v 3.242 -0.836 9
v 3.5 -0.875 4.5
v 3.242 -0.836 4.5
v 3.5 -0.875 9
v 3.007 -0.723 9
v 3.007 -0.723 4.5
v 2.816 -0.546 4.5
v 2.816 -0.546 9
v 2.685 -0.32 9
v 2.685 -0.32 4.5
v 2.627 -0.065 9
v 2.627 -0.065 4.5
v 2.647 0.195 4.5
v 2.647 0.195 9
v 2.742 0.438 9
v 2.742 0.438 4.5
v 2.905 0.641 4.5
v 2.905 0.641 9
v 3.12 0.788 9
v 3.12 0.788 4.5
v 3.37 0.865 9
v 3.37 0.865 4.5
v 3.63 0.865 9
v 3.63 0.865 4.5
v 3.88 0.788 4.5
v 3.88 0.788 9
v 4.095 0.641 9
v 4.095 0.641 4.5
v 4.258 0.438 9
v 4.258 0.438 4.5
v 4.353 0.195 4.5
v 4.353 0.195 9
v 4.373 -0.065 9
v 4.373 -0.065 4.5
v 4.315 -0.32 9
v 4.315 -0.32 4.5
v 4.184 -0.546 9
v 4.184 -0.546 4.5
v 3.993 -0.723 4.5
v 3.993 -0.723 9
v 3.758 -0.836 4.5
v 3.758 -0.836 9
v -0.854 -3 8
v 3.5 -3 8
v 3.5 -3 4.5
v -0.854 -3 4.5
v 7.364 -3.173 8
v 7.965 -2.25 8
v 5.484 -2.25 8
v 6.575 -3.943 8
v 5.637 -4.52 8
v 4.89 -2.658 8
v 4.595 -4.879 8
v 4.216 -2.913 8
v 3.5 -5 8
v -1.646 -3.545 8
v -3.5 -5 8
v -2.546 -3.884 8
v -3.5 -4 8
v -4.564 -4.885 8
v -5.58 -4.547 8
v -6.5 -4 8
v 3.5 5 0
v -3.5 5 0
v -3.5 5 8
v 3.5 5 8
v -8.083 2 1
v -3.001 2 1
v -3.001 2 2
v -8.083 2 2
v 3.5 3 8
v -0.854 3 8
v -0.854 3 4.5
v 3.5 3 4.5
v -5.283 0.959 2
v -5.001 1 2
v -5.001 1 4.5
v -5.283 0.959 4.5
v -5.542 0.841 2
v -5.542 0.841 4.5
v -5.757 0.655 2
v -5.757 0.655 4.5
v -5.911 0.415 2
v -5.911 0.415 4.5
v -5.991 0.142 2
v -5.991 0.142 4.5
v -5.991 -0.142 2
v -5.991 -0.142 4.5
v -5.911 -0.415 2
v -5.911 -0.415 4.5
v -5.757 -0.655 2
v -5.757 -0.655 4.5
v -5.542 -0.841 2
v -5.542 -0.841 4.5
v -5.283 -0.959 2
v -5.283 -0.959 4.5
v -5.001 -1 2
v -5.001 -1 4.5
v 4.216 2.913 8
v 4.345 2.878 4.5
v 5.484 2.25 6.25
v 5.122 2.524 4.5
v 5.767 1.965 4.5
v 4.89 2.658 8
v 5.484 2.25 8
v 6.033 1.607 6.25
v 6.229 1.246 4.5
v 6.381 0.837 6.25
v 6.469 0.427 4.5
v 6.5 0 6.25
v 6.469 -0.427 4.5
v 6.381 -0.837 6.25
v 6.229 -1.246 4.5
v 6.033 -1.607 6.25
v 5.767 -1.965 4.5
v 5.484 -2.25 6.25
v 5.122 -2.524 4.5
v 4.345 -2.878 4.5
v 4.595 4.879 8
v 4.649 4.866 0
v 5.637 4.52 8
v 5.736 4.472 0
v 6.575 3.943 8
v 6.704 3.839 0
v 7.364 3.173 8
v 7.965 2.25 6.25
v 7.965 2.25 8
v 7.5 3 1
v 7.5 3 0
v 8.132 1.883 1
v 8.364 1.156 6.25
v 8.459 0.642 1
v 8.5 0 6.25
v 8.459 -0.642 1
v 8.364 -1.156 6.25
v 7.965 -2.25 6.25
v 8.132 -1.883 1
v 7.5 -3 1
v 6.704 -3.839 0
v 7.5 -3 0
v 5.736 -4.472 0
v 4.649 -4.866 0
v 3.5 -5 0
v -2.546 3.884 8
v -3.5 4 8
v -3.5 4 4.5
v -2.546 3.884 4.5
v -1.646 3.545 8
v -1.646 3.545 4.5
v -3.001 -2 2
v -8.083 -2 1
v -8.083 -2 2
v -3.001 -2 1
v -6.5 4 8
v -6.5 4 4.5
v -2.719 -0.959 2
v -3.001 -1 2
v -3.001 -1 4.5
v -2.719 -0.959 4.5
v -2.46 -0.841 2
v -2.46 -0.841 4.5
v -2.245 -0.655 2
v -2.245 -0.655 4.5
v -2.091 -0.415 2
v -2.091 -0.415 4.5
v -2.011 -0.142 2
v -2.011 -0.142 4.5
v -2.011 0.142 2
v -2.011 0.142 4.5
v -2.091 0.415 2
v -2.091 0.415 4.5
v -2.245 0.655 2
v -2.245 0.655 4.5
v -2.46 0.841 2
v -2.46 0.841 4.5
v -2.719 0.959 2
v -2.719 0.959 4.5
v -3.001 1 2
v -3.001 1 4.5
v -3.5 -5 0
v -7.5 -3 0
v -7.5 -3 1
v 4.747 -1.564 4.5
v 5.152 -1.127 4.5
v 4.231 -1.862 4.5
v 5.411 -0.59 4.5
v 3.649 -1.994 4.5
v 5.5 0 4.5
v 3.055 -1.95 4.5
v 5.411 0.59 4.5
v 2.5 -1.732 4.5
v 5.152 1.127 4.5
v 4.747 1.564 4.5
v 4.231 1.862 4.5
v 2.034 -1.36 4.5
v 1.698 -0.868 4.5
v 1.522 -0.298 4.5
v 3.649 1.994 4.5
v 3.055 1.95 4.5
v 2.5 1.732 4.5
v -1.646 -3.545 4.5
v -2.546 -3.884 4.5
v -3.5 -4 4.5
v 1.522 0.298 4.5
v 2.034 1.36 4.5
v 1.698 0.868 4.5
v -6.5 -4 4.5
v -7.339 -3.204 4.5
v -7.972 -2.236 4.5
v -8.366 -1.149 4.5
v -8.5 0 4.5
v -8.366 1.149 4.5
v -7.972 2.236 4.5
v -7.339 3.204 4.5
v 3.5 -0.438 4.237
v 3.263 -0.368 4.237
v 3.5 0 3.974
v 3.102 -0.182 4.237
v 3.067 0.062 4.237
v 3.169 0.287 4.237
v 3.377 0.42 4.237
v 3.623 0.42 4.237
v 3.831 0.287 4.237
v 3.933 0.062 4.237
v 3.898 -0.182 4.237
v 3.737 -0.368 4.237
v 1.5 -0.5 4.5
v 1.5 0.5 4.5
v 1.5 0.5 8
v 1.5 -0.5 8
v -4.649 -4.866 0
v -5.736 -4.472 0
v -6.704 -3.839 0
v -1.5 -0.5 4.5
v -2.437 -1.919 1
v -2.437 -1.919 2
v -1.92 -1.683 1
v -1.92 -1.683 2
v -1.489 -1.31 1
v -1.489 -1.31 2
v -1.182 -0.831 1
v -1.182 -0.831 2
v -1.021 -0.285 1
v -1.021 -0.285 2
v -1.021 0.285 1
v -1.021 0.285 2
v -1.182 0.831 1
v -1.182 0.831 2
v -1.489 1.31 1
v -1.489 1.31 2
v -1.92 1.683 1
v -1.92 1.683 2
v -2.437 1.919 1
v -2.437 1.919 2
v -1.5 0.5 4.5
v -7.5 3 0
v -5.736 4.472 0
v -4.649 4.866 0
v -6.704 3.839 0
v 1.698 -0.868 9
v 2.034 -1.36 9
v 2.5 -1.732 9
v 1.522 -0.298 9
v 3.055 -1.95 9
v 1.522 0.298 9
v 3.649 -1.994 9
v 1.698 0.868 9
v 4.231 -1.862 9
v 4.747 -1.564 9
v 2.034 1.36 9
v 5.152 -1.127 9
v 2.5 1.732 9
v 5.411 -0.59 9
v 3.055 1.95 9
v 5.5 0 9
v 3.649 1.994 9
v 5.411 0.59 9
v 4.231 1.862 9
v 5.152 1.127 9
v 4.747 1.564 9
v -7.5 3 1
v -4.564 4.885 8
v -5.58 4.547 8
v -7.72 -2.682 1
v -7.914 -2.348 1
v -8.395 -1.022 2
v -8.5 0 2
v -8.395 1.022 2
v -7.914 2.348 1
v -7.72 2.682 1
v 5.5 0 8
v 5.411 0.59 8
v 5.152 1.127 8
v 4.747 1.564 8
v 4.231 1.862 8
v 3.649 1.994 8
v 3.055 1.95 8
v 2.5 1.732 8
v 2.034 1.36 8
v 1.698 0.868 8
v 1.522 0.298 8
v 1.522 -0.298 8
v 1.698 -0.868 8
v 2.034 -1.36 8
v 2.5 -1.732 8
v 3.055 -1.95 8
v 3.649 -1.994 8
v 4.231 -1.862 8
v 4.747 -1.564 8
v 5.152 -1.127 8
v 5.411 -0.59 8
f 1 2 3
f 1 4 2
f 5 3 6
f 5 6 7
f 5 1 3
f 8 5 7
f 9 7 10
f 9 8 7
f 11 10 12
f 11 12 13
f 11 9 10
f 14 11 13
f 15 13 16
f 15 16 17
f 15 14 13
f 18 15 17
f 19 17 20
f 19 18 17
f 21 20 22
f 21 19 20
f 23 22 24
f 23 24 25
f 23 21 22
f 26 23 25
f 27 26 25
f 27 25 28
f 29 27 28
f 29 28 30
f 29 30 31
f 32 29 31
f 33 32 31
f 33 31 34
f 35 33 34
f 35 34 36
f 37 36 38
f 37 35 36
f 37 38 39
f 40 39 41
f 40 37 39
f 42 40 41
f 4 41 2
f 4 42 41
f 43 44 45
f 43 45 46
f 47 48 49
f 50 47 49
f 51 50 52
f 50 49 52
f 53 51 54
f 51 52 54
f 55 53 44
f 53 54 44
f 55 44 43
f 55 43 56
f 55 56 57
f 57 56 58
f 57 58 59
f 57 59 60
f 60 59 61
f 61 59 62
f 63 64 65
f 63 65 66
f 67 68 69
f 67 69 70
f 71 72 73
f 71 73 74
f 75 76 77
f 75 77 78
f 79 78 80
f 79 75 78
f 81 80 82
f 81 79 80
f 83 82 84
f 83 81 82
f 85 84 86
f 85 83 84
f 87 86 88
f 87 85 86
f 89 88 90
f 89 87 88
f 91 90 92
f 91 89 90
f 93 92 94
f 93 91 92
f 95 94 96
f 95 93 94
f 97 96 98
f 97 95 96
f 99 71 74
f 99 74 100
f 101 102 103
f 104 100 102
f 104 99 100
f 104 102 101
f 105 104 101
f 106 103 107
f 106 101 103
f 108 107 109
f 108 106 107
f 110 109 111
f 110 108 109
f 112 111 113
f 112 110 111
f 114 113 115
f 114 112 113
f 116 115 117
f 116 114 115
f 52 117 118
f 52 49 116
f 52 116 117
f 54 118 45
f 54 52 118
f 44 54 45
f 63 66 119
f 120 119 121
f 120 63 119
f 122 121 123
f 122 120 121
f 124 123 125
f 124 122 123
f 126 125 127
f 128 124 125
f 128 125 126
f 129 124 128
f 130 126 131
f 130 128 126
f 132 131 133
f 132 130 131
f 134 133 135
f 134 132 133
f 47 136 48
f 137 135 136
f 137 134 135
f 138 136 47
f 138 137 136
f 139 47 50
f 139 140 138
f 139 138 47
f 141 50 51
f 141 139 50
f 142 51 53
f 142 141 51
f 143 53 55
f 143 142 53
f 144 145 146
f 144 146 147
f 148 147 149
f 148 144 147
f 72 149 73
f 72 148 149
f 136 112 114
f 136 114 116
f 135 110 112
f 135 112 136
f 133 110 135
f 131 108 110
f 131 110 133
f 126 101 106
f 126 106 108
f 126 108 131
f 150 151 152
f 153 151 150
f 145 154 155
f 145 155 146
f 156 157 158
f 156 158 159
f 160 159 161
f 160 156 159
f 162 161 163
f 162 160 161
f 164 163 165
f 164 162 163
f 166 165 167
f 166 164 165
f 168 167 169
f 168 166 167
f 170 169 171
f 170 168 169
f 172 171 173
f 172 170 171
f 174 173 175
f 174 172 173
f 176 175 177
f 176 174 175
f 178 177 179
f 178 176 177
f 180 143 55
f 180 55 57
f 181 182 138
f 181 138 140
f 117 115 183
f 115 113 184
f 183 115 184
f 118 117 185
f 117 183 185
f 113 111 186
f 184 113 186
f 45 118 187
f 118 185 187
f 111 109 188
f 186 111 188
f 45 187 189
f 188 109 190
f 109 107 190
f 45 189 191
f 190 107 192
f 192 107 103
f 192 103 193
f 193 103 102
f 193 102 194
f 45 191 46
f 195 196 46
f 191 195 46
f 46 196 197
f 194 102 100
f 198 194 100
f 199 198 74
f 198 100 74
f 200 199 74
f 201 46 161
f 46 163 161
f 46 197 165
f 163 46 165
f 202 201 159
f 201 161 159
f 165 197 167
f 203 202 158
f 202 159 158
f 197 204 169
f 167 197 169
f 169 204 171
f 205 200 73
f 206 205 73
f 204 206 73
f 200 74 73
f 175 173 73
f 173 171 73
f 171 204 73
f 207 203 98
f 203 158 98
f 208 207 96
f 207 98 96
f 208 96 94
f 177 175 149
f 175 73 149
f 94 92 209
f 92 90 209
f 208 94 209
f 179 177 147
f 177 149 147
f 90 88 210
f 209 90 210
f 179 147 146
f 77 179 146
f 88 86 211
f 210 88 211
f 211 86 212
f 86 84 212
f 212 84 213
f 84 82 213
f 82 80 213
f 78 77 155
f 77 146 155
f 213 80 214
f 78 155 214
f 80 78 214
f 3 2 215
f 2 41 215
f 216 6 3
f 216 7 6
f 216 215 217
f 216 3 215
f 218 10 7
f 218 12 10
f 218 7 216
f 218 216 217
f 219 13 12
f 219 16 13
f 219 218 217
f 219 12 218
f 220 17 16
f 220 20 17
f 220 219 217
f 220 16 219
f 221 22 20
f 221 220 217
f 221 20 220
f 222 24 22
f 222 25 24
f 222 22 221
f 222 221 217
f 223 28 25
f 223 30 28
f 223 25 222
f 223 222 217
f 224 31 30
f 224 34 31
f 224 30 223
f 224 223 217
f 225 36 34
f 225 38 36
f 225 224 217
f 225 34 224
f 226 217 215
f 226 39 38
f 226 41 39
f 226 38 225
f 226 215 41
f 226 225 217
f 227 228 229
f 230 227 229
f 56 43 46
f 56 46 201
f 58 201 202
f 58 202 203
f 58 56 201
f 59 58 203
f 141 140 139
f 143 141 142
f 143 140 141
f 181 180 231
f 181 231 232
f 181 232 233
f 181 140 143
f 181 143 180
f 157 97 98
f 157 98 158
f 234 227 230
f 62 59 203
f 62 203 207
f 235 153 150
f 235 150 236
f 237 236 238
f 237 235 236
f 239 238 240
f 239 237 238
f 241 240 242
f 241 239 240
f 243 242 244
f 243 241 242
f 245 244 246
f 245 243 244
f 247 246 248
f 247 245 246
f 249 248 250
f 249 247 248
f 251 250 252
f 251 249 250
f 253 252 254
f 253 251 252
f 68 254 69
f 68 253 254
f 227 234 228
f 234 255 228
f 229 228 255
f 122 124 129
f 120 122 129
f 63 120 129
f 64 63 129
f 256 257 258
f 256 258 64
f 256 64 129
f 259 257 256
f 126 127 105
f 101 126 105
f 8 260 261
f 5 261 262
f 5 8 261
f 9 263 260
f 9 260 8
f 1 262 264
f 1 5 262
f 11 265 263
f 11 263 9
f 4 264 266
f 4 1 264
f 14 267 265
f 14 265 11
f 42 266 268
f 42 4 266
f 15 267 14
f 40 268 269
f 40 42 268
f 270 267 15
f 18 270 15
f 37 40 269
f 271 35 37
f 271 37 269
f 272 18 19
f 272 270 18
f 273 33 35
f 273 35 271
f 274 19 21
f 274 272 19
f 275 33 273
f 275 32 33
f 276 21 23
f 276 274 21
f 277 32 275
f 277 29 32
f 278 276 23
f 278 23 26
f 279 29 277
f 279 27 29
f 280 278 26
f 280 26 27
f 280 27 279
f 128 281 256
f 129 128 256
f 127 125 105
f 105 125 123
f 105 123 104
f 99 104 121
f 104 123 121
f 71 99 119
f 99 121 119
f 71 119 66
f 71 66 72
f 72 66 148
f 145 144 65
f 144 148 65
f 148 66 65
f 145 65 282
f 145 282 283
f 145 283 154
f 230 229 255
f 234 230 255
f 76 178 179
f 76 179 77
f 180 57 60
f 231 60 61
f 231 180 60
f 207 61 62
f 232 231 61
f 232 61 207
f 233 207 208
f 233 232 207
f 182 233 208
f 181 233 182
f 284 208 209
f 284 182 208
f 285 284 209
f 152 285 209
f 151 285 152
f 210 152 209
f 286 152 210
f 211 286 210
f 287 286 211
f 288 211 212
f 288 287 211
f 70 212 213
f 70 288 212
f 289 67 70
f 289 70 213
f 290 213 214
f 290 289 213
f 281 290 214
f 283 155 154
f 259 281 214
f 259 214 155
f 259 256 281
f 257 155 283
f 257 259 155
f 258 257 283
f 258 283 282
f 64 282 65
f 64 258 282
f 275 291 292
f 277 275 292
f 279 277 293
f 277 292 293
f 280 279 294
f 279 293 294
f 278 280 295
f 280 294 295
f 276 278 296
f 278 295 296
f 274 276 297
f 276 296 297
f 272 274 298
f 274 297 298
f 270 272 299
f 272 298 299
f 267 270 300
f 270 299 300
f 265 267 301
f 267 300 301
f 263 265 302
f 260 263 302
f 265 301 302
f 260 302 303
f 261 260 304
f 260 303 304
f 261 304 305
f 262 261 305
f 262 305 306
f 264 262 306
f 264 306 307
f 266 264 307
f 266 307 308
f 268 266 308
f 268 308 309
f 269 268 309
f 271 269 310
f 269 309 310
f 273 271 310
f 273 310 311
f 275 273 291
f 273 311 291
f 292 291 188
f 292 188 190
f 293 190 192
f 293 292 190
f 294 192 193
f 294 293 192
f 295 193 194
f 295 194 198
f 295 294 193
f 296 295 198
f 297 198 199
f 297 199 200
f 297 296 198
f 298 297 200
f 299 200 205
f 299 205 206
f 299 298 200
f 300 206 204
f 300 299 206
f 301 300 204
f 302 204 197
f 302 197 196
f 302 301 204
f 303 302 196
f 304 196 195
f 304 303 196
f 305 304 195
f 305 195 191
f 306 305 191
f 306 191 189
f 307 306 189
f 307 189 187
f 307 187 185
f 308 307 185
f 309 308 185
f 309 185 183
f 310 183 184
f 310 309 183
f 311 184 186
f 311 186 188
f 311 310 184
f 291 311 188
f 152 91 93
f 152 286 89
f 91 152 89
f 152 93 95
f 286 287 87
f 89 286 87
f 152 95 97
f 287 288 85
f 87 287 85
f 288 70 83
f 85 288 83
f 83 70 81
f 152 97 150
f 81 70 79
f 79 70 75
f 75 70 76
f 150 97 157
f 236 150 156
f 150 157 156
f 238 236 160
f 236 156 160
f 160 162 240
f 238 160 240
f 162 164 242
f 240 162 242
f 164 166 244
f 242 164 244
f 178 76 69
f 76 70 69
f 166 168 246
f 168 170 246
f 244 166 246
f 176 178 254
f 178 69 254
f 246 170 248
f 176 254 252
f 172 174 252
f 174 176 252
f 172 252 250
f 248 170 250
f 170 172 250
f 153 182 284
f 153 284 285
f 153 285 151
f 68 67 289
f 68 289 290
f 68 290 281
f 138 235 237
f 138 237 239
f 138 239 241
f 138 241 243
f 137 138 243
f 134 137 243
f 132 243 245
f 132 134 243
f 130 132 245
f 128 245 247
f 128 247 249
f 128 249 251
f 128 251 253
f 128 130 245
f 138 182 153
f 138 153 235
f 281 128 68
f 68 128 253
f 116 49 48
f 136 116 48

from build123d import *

# Parameters (mm, degrees)
BOSS_EXTRUDE1_DEPTH = 8
SKETCH2_W           = 1
SKETCH2_H           = 6
CUT_EXTRUDE1_DEPTH  = 9
CUT_EXTRUDE2_DEPTH  = 1
SKETCH4_R           = 2
CUT_EXTRUDE3_DEPTH  = 3.5
BOSS_EXTRUDE3_DEPTH = 0.5
CUT_EXTRUDE4_DEPTH  = 6.025665282
CUT_EXTRUDE5_DEPTH  = 1.75
SKETCH8_R           = 2
BOSS_EXTRUDE4_DEPTH = 1


with BuildPart() as part:
    # Sketch1 → Boss-Extrude1 (new body)
    with BuildSketch(Plane.XY):
        with BuildLine():
            Line((-3.5, 5), (3.5, 5))
            ThreePointArc((3.5, 5), (8.5, 0), (3.5, -5))
            Line((3.5, -5), (-3.5, -5))
            ThreePointArc((-3.5, -5), (-8.5, 0), (-3.5, 5))
        make_face()
    extrude(amount=BOSS_EXTRUDE1_DEPTH)

    # Sketch2 → Cut-Extrude1 (cut, symmetric)
    with BuildSketch(Plane(origin=(0, 0, 0), x_dir=(0, 0, -1), z_dir=(1, 0, 0))):
        with Locations((-0.5, 0)):
            Rectangle(SKETCH2_W, SKETCH2_H)
    extrude(amount=CUT_EXTRUDE1_DEPTH, both=True, mode=Mode.SUBTRACT)

    # Sketch3 → Cut-Extrude2 (cut)
    with BuildSketch(Plane(origin=(0, 0, 1), x_dir=(-1, 0, 0), z_dir=(0, 0, -1))):
        with BuildLine():
            Line((3.000904035, 2), (8.5, 2))
            ThreePointArc((8.5, 2), (10.5, 0), (8.5, -2))
            Line((8.5, -2), (3.000904035, -2))
            ThreePointArc((3.000904035, -2), (1.000904035, 0), (3.000904035, 2))
        make_face()
    extrude(amount=-CUT_EXTRUDE2_DEPTH, mode=Mode.SUBTRACT)

    # Sketch4 → Cut-Extrude3 (cut)
    with BuildSketch(Plane.XY.offset(8)):
        with BuildLine():
            Line((-9.161583496, 4), (-3.5, 4))
            ThreePointArc((-3.5, 4), (0.5, 0), (-3.5, -4))
            Line((-3.5, -4), (-9.161583496, -4))
            ThreePointArc((-9.161583496, -4), (-13.161583496, 0), (-9.161583496, 4))
        make_face()
        with BuildLine():
            Line((-3.5, 3), (3.5, 3))
            ThreePointArc((3.5, 3), (6.5, 0), (3.5, -3))
            Line((3.5, -3), (-3.5, -3))
            ThreePointArc((-3.5, -3), (-6.5, 0), (-3.5, 3))
        make_face()
        with Locations((3.5, 0)):
            Circle(SKETCH4_R, mode=Mode.SUBTRACT)
    extrude(amount=-CUT_EXTRUDE3_DEPTH, mode=Mode.SUBTRACT)

    # Sketch6 → Cut-Extrude4 (cut)
    with BuildSketch(Plane(origin=(0, 0, 2), x_dir=(-1, 0, 0), z_dir=(0, 0, -1))):
        with BuildLine():
            Line((3.000904035, 1), (5.000904035, 1))
            ThreePointArc((5.000904035, 1), (6.000904035, 0), (5.000904035, -1))
            Line((5.000904035, -1), (3.000904035, -1))
            ThreePointArc((3.000904035, -1), (2.000904035, 0), (3.000904035, 1))
        make_face()
    extrude(amount=-CUT_EXTRUDE4_DEPTH, mode=Mode.SUBTRACT)

    # Sketch7 → Cut-Extrude5 (cut)
    with BuildSketch(Plane.XY.offset(8)):
        with BuildLine():
            Line((7.965142775, 2.25), (5.484313483, 2.25))
            ThreePointArc((5.484313483, 2.25), (6.5, 0), (5.484313483, -2.25))
            Line((5.484313483, -2.25), (7.965142775, -2.25))
            ThreePointArc((7.965142775, -2.25), (8.5, 0), (7.965142775, 2.25))
        make_face()
    extrude(amount=-CUT_EXTRUDE5_DEPTH, mode=Mode.SUBTRACT)

    # Sketch8 → Boss-Extrude4 (add)
    with BuildSketch(Plane.XY.offset(8)):
        with Locations((3.5, 0)):
            Circle(SKETCH8_R)
    extrude(amount=BOSS_EXTRUDE4_DEPTH)

    # Sketch9 → M2.2x0.45 Tapped Hole1 (revolve, cut)
    with BuildSketch(Plane(origin=(3.5, 0, 9), x_dir=(0, -1, 0), z_dir=(1, 0, 0))):
        Polygon((0, 0), (0, 5.025753042), (0.875, 4.5), (0.875, 0), align=None)
    revolve(axis=Axis((3.5, 0, 15.35), (0, 0, -1)), mode=Mode.SUBTRACT)


with BuildPart() as body_2:
    # Sketch5 → Boss-Extrude3 (new body, symmetric)
    with BuildSketch(Plane(origin=(0, 0, 0), x_dir=(1, 0, 0), z_dir=(0, 1, 0))):
        Polygon((1.5, -8), (-1.5, -4.5), (1.5, -4.5), align=None)
    extrude(amount=BOSS_EXTRUDE3_DEPTH, both=True)


solid = Compound([part.part, body_2.part])
